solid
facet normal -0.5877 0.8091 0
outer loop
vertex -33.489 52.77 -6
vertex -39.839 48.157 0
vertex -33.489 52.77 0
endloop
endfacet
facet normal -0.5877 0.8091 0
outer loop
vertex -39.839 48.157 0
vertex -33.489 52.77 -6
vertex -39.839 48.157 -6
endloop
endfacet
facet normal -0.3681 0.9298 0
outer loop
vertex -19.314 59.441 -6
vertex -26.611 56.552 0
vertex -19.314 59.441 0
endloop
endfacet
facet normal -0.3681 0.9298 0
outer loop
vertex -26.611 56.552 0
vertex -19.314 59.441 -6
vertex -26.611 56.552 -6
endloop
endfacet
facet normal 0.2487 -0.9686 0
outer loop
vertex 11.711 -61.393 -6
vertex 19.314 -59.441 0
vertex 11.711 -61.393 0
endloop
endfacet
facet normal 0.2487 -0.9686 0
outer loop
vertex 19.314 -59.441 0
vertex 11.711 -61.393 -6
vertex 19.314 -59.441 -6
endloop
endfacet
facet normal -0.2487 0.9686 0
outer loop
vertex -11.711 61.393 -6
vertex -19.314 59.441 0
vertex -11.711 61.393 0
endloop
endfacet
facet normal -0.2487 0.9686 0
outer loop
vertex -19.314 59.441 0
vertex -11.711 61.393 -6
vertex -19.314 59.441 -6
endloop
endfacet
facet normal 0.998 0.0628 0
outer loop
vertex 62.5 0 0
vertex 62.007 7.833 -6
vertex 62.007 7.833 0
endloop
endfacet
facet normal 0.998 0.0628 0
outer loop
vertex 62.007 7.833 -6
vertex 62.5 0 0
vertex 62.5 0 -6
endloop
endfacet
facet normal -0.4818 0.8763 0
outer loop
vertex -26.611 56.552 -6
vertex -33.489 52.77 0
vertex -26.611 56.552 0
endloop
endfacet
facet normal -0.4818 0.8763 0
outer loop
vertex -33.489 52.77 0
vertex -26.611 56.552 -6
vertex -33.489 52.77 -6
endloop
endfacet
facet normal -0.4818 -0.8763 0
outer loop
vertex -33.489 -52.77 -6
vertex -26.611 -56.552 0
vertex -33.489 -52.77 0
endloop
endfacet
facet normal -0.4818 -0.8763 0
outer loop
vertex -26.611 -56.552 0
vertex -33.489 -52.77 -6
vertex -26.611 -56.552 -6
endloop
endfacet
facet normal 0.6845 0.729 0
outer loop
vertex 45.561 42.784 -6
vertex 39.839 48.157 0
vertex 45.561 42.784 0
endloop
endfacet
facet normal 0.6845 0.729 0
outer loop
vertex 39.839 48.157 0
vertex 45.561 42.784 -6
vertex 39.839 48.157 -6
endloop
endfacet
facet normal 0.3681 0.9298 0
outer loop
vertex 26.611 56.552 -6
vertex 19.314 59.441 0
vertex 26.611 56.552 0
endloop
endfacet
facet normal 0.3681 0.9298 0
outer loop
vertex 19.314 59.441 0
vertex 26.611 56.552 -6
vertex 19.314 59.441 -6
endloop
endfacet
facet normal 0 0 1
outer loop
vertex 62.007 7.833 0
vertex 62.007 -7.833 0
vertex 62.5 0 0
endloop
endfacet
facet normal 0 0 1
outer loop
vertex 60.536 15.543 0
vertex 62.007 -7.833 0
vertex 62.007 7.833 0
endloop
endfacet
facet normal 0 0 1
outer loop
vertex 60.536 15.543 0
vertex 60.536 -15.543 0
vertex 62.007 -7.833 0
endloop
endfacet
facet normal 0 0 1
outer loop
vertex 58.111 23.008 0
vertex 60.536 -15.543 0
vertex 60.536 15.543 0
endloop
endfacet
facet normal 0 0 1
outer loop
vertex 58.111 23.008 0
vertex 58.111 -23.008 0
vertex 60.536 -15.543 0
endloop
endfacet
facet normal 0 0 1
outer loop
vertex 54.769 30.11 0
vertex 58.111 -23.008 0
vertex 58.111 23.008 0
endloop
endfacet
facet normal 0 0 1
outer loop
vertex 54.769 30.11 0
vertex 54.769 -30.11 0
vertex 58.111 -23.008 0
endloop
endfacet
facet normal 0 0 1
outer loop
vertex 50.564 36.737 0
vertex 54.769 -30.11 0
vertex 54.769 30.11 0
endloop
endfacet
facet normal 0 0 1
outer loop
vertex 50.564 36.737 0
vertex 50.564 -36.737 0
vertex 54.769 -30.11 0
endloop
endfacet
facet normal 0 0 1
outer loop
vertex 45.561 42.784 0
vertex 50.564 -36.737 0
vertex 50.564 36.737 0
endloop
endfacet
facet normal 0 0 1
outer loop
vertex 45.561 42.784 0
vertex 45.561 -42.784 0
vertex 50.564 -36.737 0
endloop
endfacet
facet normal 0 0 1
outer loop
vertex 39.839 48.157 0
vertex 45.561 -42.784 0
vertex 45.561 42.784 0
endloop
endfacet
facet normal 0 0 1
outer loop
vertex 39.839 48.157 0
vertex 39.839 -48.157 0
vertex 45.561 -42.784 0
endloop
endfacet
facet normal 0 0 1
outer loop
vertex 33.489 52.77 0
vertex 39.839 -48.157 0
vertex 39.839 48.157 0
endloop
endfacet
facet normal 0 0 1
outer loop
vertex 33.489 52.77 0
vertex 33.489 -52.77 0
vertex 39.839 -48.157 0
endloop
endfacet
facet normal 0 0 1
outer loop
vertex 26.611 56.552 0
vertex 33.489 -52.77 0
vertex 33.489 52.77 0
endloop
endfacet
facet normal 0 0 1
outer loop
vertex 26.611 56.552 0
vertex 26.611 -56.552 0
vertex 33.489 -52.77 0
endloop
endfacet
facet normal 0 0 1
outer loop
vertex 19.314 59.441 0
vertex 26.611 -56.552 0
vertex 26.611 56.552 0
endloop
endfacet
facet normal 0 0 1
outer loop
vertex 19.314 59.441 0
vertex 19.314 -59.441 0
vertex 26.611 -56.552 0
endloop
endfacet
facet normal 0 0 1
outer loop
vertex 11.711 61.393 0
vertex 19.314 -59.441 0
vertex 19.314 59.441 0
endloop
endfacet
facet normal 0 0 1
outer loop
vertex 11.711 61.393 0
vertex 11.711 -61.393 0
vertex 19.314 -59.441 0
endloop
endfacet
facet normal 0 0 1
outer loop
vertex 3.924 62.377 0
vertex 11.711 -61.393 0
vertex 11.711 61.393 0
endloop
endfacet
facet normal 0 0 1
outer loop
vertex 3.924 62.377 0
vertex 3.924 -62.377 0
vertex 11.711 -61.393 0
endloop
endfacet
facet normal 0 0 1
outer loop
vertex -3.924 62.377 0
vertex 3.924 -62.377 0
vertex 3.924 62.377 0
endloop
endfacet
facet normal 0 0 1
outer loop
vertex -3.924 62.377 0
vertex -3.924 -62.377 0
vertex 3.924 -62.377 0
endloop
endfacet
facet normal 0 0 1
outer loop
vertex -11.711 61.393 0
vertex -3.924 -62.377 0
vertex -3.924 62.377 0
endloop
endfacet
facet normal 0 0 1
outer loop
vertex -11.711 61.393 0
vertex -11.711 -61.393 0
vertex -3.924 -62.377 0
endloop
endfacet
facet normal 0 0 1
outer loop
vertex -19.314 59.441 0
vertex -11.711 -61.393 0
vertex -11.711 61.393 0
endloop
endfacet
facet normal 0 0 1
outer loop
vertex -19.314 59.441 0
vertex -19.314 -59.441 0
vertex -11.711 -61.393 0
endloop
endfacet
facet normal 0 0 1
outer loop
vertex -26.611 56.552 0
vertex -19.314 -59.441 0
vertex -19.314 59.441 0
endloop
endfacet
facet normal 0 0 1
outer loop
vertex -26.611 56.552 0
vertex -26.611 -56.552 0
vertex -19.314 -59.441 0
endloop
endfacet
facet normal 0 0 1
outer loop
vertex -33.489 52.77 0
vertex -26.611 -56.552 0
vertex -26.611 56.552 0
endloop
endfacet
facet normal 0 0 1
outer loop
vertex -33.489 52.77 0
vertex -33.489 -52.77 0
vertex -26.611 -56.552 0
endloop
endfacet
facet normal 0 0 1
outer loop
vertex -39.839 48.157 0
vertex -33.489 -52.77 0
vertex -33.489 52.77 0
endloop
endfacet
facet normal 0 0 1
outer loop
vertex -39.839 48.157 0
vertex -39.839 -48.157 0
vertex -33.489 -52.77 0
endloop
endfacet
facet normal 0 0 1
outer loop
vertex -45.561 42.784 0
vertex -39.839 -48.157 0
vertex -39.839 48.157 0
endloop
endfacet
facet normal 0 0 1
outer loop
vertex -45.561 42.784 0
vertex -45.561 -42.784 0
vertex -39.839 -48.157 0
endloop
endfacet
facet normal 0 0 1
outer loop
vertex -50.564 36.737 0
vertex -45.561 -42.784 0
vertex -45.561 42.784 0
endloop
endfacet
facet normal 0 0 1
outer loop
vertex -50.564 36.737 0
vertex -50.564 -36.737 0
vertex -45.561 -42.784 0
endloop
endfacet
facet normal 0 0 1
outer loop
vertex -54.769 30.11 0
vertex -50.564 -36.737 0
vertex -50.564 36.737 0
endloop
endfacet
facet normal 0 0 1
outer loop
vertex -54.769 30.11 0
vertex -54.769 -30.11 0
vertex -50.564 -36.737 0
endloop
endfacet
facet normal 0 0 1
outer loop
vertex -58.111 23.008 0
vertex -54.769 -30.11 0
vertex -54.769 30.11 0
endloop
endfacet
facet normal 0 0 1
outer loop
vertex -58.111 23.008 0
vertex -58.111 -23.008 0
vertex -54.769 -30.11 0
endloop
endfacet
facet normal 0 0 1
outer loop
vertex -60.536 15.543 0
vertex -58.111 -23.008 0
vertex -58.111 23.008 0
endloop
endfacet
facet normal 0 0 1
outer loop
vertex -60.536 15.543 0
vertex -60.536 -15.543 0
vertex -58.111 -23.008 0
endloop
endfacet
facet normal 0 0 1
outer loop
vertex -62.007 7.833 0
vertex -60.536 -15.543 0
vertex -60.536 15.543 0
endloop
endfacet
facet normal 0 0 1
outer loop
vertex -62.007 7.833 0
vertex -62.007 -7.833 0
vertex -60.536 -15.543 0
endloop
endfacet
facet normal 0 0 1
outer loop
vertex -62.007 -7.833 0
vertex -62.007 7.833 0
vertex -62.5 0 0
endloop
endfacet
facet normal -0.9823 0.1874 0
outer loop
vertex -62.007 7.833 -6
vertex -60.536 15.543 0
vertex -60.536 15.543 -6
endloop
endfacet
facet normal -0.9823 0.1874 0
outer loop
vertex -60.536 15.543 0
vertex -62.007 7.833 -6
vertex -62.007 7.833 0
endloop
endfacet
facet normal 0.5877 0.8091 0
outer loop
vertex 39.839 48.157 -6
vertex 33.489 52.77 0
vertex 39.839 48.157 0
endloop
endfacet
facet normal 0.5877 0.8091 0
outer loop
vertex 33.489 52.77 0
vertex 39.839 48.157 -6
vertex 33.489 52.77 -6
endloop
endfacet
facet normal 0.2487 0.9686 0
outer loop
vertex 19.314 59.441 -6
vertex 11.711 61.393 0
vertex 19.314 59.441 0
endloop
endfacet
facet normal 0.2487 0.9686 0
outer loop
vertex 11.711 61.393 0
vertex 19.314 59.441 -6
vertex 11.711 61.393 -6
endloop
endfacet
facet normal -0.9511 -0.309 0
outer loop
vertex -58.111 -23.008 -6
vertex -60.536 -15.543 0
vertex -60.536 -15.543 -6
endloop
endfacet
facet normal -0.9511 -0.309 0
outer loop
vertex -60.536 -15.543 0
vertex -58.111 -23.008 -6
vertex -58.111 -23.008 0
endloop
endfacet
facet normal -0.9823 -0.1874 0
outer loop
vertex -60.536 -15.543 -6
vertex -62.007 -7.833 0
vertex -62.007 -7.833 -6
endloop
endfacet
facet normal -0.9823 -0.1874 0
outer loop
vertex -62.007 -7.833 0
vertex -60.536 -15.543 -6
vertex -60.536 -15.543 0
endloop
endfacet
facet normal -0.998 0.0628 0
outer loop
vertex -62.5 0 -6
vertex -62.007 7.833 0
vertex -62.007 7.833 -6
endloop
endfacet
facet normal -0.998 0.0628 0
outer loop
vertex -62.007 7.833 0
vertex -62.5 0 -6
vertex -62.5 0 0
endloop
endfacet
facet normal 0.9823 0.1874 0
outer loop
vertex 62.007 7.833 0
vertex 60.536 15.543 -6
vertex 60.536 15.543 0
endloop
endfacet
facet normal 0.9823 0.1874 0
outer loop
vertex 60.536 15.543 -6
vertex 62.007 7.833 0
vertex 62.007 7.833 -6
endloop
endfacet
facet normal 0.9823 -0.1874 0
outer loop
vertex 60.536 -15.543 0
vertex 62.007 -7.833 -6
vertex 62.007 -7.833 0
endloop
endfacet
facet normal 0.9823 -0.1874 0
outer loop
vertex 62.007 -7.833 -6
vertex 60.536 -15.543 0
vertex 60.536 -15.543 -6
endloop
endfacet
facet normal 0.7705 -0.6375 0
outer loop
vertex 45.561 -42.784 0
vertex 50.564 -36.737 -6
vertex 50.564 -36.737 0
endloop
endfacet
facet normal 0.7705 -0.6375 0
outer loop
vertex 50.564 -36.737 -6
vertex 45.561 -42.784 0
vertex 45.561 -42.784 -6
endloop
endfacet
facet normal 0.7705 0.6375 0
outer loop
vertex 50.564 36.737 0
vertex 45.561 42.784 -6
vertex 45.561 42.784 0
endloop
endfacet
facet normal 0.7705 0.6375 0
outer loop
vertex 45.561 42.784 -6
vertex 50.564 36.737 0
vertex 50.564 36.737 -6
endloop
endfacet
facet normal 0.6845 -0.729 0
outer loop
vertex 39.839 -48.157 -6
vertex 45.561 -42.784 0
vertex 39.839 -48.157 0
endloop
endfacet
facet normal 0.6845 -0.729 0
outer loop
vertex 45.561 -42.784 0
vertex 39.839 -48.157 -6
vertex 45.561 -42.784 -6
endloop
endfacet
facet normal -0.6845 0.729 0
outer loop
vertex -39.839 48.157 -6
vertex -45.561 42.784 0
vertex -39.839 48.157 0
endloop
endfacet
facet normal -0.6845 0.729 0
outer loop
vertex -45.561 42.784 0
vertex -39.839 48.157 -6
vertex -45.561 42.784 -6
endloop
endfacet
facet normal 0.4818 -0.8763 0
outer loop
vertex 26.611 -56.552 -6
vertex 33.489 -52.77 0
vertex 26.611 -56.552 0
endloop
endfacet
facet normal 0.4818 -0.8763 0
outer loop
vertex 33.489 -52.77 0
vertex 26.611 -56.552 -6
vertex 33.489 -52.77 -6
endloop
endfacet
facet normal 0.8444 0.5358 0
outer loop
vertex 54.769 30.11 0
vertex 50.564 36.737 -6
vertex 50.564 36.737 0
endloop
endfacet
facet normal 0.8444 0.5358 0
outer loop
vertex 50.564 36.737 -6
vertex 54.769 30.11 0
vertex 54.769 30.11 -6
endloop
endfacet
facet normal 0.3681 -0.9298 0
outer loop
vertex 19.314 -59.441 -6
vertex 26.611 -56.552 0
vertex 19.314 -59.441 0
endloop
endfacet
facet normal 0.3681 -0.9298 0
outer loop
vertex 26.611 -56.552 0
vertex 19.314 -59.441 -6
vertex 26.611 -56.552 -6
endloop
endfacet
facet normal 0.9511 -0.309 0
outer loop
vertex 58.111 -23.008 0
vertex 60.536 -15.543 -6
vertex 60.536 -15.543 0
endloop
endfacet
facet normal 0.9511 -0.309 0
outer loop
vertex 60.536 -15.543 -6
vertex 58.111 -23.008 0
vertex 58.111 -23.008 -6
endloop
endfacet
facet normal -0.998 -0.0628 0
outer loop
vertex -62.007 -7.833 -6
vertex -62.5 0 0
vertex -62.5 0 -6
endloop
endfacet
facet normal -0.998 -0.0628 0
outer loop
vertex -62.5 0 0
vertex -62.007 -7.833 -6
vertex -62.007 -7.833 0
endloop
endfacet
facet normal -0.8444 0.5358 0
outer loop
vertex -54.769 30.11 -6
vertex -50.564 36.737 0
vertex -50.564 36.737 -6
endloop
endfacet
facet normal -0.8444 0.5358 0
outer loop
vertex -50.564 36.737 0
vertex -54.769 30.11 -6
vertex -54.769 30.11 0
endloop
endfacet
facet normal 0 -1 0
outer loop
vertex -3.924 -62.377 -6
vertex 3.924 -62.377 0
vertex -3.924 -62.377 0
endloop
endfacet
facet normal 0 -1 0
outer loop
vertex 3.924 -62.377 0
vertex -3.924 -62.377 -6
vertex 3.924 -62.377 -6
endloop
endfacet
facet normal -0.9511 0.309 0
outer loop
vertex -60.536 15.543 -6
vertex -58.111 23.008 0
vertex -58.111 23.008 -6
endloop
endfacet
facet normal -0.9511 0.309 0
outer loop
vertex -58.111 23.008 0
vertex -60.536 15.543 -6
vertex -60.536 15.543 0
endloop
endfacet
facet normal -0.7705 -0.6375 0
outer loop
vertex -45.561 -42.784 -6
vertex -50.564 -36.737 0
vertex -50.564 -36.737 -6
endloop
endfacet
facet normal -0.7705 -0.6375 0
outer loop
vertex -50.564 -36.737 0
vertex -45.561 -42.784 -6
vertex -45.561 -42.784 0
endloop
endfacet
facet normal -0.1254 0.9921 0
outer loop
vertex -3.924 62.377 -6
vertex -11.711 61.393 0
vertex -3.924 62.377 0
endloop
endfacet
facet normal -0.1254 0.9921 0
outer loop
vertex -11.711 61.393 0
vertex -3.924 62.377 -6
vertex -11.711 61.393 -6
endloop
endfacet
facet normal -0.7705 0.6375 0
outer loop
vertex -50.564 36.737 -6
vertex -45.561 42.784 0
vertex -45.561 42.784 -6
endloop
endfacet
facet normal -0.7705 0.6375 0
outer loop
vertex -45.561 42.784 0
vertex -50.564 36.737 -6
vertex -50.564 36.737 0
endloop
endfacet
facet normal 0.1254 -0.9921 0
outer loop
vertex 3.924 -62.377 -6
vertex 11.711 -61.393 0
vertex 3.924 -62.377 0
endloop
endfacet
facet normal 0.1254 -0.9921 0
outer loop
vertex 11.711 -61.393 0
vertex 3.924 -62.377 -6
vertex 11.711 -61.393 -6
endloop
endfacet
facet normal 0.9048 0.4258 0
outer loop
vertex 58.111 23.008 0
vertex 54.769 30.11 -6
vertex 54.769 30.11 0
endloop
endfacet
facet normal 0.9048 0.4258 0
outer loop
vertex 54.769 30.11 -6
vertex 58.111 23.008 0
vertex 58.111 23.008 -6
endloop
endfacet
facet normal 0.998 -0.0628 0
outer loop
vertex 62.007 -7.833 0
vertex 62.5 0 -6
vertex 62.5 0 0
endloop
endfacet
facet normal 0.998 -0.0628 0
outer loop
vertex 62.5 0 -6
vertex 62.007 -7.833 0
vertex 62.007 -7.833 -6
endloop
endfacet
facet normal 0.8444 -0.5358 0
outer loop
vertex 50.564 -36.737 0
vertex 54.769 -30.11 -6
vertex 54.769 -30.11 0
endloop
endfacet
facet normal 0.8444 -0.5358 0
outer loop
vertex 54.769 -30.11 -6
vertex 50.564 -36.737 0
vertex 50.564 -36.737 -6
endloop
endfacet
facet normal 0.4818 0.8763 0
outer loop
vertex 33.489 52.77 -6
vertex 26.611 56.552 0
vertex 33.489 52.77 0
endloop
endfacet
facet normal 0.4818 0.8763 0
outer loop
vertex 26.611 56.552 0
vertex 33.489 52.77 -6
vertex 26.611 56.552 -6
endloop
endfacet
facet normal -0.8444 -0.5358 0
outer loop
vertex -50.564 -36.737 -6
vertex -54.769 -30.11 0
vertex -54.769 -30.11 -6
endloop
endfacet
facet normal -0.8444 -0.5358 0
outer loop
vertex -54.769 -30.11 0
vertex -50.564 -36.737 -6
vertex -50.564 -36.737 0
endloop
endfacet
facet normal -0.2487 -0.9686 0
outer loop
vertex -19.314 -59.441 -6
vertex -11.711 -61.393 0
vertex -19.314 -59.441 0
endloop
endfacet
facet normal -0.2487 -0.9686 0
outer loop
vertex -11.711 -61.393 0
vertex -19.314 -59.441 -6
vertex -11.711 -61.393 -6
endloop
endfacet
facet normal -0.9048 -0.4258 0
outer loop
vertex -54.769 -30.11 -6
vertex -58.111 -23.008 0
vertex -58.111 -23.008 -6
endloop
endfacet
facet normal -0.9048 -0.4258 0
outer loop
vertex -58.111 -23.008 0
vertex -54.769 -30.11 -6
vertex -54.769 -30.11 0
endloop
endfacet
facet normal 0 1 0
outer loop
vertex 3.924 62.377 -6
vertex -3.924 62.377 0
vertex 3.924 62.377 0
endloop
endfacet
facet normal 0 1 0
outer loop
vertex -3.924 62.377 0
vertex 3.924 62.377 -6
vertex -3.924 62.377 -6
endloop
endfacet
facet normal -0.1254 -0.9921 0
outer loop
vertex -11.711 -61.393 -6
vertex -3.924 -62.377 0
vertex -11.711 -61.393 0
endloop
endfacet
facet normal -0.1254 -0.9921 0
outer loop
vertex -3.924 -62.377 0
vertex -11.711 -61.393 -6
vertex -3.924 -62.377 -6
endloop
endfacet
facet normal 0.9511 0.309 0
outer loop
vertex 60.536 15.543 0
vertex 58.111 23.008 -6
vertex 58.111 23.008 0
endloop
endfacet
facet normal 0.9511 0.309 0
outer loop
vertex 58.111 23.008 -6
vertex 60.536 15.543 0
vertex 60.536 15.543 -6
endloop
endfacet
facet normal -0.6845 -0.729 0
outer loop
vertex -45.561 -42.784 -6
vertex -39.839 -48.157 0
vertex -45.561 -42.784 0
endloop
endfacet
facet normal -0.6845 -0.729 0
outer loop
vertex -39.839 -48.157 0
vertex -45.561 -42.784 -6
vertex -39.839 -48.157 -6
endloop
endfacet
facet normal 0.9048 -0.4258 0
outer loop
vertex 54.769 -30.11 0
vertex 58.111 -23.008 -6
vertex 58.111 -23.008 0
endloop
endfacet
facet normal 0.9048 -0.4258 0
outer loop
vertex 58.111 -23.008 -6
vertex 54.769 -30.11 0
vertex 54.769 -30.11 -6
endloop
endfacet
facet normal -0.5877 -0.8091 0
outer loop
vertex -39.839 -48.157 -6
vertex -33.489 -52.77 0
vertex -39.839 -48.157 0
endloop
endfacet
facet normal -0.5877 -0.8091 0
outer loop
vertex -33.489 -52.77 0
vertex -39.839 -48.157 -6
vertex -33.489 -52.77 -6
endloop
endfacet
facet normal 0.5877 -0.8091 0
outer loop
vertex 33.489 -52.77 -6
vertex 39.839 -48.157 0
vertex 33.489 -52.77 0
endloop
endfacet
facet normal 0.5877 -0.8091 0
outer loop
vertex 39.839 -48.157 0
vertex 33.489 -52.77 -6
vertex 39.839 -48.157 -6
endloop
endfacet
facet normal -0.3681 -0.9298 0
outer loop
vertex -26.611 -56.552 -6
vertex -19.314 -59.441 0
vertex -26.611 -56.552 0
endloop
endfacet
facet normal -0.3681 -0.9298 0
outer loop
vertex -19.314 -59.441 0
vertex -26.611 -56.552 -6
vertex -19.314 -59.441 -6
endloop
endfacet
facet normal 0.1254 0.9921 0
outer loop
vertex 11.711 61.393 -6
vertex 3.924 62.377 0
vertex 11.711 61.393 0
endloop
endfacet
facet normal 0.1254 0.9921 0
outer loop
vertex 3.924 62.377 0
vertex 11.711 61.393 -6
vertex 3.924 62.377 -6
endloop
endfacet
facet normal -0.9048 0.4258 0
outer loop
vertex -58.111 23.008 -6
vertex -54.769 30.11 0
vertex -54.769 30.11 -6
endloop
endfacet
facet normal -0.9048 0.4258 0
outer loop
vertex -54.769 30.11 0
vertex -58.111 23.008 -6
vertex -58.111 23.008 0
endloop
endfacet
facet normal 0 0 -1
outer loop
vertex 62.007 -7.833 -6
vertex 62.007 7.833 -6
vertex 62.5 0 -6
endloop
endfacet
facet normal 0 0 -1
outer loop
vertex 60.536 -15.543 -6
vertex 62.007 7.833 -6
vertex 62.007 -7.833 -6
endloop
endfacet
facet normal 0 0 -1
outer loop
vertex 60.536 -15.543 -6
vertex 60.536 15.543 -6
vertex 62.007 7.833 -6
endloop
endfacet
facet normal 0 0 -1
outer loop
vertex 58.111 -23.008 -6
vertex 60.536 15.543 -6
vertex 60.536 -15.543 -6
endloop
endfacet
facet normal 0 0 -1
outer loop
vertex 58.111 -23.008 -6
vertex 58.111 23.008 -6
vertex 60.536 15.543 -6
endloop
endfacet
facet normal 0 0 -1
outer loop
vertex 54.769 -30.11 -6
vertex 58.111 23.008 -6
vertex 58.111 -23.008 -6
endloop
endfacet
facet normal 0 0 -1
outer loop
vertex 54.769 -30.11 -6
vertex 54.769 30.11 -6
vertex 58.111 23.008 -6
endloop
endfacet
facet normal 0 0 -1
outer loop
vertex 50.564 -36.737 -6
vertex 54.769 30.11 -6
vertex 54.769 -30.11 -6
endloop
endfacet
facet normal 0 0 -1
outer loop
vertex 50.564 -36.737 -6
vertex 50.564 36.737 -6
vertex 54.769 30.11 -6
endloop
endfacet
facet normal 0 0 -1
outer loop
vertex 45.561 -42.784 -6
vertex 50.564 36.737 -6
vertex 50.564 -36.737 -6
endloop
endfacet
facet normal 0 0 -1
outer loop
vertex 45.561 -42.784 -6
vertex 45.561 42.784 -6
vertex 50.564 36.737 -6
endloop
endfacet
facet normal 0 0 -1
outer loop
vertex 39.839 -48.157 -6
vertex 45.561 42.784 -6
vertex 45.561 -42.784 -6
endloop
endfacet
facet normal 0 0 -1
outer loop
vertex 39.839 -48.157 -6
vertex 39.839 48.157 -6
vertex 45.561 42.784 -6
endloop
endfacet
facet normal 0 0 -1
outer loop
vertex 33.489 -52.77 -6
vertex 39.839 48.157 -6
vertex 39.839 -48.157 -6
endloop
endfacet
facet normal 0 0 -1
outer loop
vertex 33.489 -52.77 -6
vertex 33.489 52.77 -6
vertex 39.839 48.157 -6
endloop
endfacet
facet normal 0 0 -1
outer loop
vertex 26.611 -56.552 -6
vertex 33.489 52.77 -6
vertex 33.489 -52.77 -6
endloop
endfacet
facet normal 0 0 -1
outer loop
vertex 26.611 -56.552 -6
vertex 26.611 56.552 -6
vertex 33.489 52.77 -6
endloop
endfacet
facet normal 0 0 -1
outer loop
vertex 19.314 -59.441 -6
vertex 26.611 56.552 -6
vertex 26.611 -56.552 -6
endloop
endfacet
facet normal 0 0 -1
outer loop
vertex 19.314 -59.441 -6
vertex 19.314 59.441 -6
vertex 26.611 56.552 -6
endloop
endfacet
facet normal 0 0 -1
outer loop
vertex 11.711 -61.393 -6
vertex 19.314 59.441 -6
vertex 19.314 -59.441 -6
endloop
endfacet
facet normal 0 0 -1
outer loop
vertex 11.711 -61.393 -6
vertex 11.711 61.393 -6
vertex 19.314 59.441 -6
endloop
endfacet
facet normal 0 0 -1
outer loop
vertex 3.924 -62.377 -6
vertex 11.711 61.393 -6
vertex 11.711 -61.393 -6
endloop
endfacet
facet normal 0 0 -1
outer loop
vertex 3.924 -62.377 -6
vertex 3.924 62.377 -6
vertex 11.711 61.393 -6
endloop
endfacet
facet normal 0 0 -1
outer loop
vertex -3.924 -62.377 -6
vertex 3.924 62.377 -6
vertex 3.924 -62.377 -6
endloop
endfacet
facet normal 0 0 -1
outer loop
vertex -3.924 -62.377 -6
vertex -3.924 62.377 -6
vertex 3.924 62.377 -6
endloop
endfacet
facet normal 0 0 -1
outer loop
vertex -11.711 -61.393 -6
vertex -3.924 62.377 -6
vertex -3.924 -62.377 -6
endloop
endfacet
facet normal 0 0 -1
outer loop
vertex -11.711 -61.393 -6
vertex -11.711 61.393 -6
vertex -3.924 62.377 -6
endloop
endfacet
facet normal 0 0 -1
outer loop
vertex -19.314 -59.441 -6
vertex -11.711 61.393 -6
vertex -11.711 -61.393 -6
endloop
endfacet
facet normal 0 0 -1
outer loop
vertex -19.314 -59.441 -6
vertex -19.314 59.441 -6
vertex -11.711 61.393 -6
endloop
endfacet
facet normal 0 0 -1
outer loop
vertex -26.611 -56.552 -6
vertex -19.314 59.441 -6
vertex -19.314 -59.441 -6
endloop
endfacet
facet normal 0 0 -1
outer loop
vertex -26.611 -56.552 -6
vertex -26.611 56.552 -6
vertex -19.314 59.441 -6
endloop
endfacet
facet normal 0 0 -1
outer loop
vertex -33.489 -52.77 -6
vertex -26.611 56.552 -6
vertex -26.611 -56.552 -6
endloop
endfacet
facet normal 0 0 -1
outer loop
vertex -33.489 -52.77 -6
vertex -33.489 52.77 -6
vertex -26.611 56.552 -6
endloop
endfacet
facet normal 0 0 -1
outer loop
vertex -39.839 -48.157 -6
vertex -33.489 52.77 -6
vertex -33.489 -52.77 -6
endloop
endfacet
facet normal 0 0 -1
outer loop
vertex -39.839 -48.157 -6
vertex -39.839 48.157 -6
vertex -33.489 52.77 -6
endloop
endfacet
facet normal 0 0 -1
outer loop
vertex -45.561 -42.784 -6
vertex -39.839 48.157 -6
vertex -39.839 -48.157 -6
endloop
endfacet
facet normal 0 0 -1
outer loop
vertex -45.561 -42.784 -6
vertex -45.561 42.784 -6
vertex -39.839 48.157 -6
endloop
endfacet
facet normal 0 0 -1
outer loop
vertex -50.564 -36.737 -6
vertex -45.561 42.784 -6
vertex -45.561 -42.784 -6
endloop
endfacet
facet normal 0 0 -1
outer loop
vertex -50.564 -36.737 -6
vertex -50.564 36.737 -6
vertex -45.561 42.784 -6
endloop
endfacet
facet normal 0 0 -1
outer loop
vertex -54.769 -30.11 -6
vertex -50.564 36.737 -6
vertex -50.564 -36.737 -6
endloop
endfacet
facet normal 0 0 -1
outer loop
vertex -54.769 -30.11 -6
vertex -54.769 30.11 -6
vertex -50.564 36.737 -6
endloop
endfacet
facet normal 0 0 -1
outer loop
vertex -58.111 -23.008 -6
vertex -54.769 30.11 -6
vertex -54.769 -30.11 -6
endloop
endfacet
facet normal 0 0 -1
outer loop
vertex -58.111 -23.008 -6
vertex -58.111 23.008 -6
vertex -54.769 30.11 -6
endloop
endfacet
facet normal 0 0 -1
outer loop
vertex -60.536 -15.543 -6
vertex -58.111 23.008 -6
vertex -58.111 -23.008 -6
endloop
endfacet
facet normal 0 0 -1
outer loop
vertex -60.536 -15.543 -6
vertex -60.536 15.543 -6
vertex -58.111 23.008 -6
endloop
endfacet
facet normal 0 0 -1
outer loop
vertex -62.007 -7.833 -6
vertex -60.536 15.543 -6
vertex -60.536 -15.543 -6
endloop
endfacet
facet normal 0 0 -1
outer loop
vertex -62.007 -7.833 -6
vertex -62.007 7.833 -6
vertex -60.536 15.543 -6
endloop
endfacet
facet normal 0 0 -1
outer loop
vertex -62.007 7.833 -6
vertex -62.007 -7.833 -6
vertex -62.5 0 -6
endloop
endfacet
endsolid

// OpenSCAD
$fn = 50;


difference() {
	union() {
		cylinder(h = 0, r = 12.5000000000);
		translate(v = [0, 0, -6.0000000000]) {
			cylinder(h = 6, r = 62.5000000000);
		}
	}
	union() {
		#translate(v = [8.0000000000, 0.0000000000, 0]) {
			cylinder(h = 0, r = 3.2500000000);
		}
		#translate(v = [-4.0000000000, 6.9282032303, 0]) {
			cylinder(h = 0, r = 3.2500000000);
		}
		#translate(v = [-4.0000000000, -6.9282032303, 0]) {
			cylinder(h = 0, r = 3.2500000000);
		}
	}
}
